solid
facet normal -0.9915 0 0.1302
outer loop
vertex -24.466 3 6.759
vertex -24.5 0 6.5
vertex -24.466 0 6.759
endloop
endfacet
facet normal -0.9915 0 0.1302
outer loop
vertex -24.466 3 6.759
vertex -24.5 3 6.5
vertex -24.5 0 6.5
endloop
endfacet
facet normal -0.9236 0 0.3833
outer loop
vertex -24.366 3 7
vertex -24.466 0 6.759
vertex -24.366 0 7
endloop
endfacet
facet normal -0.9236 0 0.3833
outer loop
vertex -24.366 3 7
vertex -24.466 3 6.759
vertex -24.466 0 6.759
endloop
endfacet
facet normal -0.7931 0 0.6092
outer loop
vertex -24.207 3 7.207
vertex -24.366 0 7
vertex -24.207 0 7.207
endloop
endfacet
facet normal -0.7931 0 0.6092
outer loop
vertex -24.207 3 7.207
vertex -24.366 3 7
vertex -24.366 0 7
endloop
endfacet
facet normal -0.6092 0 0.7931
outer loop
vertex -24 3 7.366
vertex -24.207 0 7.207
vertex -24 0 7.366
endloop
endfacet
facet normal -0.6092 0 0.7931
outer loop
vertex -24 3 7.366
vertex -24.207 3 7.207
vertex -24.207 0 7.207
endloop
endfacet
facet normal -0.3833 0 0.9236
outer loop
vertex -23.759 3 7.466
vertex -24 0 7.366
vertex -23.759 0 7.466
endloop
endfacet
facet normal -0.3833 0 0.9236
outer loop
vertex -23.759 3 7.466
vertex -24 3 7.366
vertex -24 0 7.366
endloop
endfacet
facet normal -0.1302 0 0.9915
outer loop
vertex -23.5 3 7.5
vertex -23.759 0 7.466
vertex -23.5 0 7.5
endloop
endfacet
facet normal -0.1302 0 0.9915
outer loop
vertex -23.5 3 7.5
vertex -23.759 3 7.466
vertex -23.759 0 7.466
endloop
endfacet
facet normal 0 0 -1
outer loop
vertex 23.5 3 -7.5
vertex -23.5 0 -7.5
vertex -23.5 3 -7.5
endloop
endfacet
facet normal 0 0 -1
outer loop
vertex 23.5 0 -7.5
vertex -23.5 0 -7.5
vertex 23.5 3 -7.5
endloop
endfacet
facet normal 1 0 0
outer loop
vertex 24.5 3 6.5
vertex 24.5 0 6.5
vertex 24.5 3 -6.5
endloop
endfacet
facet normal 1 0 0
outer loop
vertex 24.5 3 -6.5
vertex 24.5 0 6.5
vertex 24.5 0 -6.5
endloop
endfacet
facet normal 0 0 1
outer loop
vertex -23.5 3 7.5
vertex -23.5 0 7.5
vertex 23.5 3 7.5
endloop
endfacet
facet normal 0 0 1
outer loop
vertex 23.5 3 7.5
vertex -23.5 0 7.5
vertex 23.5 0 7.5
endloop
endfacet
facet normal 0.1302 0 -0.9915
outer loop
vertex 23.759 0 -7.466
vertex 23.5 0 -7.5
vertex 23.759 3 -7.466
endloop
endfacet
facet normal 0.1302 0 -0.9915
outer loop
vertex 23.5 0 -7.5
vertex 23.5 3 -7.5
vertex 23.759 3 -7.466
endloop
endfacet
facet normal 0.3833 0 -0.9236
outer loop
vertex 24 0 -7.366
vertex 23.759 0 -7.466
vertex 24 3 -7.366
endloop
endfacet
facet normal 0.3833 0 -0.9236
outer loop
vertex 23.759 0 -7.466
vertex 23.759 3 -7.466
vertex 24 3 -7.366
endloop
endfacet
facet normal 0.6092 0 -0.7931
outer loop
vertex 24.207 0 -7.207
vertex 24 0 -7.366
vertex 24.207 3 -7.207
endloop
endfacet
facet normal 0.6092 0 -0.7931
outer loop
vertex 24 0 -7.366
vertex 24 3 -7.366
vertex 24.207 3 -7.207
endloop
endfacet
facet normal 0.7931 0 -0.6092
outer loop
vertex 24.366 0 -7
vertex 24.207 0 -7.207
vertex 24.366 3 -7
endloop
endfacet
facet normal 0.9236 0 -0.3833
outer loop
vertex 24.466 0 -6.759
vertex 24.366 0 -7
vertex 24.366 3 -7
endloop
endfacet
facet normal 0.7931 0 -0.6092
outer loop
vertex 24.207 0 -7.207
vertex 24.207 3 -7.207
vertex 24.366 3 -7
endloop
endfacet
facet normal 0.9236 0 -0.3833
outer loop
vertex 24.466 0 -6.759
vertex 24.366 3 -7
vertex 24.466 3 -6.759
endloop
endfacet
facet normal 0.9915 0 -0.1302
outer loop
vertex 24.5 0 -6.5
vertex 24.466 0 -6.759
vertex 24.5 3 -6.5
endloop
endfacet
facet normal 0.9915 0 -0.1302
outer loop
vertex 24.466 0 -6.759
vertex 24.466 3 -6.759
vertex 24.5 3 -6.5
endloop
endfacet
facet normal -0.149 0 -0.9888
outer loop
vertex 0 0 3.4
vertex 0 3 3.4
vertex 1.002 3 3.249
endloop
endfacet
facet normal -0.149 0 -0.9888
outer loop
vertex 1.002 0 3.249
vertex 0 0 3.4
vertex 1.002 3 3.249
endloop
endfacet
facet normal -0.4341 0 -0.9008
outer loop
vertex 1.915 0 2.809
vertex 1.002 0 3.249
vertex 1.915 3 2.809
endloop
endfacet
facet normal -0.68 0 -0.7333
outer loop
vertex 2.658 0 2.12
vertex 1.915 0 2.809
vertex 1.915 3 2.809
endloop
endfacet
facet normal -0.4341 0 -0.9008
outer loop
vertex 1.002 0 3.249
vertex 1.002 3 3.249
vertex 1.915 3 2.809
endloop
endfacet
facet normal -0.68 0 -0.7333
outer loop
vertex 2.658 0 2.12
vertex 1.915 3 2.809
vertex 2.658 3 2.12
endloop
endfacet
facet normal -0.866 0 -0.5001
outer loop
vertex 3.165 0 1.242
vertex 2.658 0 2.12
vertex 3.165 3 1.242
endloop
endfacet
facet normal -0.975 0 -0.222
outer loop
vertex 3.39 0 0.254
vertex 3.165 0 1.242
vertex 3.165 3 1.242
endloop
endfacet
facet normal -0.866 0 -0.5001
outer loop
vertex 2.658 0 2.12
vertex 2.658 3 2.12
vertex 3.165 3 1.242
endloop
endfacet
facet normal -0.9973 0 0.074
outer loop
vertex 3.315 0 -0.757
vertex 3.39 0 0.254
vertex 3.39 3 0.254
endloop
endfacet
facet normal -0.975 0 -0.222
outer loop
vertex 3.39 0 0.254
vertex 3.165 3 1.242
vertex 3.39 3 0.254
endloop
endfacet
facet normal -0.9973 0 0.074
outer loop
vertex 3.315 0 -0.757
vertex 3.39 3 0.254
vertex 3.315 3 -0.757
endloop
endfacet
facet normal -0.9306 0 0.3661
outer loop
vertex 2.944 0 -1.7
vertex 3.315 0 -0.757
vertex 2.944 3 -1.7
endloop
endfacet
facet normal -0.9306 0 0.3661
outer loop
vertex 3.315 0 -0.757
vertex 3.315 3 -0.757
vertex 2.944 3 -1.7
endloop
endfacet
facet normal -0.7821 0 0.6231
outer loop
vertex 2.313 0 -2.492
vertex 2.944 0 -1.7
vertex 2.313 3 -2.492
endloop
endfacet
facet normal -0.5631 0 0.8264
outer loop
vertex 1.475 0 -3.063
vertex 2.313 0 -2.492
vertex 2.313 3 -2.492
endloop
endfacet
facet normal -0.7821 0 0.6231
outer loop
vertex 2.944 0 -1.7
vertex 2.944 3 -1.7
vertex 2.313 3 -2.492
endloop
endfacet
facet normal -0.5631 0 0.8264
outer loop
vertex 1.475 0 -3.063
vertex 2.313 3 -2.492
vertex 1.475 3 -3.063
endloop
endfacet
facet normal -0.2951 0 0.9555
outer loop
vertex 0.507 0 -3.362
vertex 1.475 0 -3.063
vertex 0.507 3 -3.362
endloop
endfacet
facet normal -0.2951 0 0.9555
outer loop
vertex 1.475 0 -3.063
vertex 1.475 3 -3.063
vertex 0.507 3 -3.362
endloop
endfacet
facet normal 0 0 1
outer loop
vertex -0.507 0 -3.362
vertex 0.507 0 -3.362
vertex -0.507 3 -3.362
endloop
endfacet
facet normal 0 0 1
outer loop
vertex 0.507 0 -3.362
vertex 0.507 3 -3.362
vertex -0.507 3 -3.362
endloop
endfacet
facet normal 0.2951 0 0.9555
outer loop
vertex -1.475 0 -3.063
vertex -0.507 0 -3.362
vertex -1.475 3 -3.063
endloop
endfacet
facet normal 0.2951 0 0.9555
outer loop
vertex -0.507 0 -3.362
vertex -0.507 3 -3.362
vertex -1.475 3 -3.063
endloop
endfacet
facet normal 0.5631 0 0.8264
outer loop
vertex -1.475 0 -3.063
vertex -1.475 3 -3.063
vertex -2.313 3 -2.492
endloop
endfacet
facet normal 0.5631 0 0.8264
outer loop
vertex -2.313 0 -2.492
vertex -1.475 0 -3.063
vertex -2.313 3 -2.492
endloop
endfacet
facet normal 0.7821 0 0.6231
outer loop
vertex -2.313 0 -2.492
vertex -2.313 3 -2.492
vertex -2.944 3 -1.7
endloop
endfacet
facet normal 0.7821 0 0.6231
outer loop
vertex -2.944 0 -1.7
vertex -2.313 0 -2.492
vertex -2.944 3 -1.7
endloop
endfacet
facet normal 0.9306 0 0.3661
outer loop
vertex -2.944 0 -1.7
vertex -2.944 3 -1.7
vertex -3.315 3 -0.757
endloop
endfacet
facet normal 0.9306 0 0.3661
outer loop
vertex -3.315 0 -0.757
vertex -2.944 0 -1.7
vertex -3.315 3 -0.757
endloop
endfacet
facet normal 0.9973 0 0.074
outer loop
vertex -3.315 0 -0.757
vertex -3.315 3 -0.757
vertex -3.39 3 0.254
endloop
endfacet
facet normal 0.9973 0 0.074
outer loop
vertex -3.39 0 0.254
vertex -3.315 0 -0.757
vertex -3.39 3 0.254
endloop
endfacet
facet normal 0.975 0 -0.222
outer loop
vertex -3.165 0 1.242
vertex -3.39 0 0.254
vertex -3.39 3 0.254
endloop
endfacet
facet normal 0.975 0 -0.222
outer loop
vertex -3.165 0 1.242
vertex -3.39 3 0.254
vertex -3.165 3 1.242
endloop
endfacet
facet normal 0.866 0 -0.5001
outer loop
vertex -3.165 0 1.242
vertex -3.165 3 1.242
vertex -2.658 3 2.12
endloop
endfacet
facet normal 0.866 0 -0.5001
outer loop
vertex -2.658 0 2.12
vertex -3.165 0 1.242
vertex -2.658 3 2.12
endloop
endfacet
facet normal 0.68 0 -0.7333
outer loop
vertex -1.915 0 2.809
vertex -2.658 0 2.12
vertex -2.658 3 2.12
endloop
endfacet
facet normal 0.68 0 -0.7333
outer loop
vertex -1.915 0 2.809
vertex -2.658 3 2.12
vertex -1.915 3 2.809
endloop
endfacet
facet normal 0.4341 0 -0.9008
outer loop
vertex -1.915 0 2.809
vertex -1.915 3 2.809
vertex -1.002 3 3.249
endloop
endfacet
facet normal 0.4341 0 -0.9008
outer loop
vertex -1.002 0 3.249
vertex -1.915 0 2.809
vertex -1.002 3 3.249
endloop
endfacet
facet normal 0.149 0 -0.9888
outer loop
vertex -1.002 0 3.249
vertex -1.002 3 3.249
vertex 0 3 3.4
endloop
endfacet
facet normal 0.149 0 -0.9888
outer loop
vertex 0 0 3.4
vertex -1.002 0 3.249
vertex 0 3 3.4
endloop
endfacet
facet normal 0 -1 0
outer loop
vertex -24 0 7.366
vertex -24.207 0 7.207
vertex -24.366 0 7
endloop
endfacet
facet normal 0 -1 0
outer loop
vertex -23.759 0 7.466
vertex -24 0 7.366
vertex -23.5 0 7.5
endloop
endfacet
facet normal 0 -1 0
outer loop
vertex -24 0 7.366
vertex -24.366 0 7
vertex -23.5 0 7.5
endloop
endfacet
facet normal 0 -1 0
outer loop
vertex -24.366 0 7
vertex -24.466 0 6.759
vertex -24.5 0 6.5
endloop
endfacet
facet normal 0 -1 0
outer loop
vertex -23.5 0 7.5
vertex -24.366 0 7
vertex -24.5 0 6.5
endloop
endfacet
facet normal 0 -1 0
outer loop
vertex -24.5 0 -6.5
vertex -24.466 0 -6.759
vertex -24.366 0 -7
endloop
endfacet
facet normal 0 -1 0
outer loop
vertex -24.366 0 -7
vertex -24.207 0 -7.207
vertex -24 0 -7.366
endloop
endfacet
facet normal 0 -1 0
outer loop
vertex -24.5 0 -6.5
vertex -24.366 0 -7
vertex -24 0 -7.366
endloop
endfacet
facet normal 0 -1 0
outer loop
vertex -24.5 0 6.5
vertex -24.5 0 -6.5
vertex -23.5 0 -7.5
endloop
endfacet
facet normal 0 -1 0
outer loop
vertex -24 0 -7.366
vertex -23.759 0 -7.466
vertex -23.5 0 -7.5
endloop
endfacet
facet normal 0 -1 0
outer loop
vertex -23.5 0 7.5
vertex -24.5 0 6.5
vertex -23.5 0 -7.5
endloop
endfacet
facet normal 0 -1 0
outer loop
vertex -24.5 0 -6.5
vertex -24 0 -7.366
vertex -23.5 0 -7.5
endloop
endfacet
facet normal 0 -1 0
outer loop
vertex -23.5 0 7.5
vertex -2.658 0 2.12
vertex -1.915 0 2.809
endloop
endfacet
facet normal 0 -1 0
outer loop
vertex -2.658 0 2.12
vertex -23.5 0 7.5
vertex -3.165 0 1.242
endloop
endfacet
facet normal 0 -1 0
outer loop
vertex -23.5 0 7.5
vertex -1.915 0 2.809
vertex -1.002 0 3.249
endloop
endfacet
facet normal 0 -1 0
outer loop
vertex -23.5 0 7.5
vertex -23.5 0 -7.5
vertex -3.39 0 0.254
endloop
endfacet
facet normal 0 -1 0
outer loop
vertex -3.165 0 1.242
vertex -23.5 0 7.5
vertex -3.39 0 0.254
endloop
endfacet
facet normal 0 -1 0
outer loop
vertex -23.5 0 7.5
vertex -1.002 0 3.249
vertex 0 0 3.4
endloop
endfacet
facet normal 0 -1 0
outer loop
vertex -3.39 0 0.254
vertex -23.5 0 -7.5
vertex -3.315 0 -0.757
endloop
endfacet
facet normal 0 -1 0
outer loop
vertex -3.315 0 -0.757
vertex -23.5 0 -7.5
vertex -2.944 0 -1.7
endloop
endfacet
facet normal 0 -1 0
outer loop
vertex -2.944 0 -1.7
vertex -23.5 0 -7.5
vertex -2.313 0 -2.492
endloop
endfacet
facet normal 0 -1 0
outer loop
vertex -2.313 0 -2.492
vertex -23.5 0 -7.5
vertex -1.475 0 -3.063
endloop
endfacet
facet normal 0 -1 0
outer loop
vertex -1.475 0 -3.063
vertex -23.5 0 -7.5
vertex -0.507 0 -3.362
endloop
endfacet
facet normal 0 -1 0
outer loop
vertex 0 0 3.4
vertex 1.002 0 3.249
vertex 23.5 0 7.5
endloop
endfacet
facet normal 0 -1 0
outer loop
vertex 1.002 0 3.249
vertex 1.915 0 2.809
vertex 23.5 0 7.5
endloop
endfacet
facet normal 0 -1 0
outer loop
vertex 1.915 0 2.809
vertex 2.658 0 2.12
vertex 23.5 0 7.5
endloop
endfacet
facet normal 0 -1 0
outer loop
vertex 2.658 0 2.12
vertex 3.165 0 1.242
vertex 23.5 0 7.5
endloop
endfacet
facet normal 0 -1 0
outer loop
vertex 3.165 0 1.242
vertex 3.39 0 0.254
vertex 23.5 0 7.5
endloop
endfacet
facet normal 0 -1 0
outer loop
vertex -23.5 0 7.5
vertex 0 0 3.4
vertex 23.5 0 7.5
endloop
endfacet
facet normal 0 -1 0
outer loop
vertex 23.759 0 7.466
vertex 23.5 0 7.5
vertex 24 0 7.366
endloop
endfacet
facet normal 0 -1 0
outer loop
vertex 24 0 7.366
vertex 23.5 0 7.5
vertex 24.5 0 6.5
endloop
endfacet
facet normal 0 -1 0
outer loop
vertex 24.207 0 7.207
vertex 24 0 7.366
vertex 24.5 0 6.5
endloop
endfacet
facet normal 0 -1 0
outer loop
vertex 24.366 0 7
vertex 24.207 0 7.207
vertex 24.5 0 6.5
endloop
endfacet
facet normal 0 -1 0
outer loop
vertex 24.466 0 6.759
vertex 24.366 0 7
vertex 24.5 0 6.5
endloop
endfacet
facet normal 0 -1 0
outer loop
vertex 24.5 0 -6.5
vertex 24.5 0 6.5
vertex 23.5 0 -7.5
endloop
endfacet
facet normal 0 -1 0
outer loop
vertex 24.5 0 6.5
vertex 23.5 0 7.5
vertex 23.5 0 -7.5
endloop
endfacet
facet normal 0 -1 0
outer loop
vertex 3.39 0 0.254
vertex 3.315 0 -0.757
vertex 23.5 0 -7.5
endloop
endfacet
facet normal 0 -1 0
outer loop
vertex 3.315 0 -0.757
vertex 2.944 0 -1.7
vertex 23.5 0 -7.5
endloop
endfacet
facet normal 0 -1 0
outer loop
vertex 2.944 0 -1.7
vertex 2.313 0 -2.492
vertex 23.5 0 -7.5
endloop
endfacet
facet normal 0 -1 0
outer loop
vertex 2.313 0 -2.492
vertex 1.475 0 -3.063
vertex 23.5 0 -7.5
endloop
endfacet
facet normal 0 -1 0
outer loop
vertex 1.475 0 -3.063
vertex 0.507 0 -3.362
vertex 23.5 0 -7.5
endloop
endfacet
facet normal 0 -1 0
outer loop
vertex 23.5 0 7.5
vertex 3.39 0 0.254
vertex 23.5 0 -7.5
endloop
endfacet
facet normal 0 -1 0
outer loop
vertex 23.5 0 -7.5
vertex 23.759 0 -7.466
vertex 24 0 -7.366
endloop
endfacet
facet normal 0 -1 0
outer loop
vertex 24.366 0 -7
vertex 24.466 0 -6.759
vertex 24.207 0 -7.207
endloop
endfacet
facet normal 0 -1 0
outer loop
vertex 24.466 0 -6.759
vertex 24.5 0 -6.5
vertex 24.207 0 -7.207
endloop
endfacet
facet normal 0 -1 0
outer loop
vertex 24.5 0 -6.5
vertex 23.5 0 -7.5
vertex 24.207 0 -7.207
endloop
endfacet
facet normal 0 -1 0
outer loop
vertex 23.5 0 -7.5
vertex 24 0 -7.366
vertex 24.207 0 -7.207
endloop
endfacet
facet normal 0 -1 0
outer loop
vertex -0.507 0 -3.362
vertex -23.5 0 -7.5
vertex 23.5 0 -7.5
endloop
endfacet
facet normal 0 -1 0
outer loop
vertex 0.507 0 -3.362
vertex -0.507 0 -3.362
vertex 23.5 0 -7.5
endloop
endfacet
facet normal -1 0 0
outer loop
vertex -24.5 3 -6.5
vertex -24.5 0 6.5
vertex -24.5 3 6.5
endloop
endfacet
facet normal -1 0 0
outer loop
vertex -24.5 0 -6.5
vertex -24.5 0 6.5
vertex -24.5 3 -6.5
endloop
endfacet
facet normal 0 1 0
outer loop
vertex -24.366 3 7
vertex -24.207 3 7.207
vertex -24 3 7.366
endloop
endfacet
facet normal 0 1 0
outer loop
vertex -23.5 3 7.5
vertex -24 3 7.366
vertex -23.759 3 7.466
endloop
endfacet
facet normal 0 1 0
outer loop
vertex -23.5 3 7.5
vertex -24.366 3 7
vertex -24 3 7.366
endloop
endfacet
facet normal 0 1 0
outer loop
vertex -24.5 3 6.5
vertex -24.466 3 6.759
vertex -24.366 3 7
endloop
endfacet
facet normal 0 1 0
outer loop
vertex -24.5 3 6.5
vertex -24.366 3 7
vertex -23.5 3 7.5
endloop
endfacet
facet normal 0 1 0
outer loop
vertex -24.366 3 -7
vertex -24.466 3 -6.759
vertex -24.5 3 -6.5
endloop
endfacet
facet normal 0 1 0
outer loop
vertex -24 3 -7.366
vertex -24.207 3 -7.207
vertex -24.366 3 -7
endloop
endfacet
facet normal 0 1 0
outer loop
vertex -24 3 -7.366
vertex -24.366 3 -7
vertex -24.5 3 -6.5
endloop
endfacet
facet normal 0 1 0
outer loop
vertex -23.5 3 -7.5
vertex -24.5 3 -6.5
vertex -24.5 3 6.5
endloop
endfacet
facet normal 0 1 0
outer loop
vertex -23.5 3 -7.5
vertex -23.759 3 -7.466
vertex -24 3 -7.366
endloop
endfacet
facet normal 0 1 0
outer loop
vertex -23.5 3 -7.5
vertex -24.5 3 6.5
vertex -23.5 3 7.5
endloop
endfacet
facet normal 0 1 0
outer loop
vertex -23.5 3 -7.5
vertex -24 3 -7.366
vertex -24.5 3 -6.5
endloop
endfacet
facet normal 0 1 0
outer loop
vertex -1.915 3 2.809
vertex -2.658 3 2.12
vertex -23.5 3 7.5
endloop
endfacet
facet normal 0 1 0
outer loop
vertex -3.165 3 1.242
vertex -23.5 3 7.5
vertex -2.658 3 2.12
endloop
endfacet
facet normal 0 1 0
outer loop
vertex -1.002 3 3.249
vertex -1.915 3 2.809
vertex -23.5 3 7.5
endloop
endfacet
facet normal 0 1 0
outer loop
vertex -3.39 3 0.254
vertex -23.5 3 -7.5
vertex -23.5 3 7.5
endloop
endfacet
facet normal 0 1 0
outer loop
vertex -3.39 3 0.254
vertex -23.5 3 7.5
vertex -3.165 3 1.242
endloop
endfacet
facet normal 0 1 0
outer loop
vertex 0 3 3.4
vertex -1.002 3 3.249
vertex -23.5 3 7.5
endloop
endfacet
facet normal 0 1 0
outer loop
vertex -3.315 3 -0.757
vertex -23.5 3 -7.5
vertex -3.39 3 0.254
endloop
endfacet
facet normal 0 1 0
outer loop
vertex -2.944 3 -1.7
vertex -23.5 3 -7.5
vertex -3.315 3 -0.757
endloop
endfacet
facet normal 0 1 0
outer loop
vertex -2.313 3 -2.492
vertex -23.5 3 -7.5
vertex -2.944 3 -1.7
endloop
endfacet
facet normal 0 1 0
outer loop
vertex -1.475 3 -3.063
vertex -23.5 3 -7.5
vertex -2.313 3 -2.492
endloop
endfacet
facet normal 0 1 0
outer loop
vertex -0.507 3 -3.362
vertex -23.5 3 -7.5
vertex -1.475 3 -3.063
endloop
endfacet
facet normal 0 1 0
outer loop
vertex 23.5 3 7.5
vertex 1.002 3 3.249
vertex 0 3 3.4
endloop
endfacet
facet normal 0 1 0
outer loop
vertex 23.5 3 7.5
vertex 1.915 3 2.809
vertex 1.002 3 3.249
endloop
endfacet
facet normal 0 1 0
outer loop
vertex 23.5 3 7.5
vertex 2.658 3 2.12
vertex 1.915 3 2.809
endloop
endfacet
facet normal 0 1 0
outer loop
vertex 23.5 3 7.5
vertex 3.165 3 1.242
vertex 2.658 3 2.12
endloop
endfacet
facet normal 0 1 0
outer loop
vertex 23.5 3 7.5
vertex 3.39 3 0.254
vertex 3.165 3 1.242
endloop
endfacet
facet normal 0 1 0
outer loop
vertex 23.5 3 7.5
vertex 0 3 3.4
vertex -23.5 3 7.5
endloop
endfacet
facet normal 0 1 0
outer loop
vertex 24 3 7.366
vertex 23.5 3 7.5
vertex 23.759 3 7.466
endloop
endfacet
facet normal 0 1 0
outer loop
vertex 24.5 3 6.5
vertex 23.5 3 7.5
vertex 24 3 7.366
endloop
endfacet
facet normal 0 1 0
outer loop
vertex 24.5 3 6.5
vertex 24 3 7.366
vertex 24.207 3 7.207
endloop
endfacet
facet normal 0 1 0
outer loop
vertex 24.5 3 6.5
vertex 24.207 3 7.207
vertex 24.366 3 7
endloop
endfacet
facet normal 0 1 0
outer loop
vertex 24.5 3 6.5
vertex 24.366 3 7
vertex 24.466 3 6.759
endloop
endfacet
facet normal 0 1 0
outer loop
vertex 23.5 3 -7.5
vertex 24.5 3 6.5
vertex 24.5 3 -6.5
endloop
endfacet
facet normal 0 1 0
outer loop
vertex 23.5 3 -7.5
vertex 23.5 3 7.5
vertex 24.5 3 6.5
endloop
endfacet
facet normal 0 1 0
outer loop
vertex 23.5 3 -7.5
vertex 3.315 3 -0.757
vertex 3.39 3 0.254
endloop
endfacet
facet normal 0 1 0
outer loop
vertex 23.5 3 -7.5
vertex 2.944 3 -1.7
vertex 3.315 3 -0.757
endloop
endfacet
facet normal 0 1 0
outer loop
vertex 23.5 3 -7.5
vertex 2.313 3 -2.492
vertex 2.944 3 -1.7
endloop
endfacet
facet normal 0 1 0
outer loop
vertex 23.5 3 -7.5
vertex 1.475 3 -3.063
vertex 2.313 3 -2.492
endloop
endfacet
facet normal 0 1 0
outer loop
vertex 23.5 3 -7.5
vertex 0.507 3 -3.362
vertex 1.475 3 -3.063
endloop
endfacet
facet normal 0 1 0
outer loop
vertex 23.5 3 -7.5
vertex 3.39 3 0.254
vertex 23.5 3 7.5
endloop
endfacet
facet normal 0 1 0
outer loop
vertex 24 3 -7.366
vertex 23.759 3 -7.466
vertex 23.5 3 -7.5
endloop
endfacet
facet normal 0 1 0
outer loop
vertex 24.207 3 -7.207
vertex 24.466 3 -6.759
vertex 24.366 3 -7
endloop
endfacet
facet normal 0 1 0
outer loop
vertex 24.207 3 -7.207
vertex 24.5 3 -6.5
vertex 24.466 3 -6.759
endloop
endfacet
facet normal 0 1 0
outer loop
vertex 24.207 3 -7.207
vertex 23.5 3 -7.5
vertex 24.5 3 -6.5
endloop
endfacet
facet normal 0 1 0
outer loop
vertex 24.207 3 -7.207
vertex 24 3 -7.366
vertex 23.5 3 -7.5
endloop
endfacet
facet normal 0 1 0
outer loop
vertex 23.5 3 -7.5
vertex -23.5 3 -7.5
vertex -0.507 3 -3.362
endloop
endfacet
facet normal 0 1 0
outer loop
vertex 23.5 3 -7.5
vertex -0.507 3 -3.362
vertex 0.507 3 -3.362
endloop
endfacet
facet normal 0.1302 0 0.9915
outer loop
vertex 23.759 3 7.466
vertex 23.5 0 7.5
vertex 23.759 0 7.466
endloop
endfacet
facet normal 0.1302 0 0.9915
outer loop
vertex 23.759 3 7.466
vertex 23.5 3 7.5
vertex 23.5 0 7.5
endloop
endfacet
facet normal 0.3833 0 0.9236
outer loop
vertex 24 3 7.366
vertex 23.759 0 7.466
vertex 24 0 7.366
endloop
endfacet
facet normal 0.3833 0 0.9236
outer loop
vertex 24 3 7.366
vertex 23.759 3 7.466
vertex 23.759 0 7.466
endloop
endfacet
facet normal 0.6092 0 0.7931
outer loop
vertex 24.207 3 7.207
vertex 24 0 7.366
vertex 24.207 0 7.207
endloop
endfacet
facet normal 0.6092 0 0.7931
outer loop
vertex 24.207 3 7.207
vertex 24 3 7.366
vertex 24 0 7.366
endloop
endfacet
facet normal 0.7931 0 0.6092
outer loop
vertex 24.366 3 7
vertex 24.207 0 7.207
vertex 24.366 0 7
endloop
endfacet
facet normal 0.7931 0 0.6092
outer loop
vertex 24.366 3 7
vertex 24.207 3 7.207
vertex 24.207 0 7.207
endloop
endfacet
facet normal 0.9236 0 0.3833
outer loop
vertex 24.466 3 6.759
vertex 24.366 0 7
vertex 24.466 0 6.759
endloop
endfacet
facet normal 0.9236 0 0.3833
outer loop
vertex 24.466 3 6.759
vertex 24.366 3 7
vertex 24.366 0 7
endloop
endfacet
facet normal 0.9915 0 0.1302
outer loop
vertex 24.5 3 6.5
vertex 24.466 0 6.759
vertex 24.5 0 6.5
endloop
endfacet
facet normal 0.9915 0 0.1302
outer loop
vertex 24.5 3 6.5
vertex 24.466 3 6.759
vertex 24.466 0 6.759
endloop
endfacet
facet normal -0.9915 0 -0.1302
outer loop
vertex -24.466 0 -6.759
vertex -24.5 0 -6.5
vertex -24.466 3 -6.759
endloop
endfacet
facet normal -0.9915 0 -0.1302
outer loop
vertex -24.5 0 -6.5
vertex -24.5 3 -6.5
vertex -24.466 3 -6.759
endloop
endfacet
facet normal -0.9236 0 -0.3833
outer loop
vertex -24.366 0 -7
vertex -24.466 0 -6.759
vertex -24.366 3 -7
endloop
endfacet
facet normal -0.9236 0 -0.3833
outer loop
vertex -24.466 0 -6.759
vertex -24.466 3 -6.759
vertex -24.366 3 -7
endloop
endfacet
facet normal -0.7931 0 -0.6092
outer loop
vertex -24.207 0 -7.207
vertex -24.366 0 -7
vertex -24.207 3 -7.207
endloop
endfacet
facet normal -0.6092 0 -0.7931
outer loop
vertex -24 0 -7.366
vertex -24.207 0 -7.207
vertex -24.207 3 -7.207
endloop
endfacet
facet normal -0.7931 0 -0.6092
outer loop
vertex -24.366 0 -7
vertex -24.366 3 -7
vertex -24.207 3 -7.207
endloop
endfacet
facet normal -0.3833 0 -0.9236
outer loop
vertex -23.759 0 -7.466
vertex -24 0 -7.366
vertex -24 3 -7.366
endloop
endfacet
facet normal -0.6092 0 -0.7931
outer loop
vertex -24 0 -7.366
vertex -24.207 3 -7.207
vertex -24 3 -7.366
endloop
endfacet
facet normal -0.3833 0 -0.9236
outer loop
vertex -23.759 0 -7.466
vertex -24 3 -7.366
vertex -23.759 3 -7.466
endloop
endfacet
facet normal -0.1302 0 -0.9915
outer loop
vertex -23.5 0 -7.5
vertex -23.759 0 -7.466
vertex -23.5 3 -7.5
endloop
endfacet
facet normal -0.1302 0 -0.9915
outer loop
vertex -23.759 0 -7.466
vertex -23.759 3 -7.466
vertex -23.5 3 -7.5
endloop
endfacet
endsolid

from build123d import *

# Parameters (mm, degrees)
SKETCH1_W           = 49
SKETCH1_H           = 15
BOSS_EXTRUDE1_DEPTH = 3
SKETCH2_R           = 3.4
CUT_EXTRUDE1_DEPTH  = 26.797286679
FILLET1_R           = 1


with BuildPart() as part:
    # Sketch1 → Boss-Extrude1 (new body)
    with BuildSketch(Plane(origin=(0, 0, 0), x_dir=(1, 0, 0), z_dir=(0, 1, 0))):
        Rectangle(SKETCH1_W, SKETCH1_H)
    extrude(amount=BOSS_EXTRUDE1_DEPTH)

    # Sketch2 → Cut-Extrude1 (cut, through all)
    with BuildSketch(Plane(origin=(0, 3, 0), x_dir=(1, 0, 0), z_dir=(0, 1, 0))):
        with Locations(Location((0, 0, 0), (0, 0, 270))):
            Circle(SKETCH2_R)
    extrude(amount=-CUT_EXTRUDE1_DEPTH, mode=Mode.SUBTRACT)

    # Fillet1
    fillet1_edges = [part.edges().sort_by_distance(p)[0] for p in [
        (-24.5, 1.5, -7.5),
        (24.5, 1.5, -7.5),
        (24.5, 1.5, 7.5),
        (-24.5, 1.5, 7.5),
    ]]
    fillet(fillet1_edges, radius=FILLET1_R)


solid = part.part
